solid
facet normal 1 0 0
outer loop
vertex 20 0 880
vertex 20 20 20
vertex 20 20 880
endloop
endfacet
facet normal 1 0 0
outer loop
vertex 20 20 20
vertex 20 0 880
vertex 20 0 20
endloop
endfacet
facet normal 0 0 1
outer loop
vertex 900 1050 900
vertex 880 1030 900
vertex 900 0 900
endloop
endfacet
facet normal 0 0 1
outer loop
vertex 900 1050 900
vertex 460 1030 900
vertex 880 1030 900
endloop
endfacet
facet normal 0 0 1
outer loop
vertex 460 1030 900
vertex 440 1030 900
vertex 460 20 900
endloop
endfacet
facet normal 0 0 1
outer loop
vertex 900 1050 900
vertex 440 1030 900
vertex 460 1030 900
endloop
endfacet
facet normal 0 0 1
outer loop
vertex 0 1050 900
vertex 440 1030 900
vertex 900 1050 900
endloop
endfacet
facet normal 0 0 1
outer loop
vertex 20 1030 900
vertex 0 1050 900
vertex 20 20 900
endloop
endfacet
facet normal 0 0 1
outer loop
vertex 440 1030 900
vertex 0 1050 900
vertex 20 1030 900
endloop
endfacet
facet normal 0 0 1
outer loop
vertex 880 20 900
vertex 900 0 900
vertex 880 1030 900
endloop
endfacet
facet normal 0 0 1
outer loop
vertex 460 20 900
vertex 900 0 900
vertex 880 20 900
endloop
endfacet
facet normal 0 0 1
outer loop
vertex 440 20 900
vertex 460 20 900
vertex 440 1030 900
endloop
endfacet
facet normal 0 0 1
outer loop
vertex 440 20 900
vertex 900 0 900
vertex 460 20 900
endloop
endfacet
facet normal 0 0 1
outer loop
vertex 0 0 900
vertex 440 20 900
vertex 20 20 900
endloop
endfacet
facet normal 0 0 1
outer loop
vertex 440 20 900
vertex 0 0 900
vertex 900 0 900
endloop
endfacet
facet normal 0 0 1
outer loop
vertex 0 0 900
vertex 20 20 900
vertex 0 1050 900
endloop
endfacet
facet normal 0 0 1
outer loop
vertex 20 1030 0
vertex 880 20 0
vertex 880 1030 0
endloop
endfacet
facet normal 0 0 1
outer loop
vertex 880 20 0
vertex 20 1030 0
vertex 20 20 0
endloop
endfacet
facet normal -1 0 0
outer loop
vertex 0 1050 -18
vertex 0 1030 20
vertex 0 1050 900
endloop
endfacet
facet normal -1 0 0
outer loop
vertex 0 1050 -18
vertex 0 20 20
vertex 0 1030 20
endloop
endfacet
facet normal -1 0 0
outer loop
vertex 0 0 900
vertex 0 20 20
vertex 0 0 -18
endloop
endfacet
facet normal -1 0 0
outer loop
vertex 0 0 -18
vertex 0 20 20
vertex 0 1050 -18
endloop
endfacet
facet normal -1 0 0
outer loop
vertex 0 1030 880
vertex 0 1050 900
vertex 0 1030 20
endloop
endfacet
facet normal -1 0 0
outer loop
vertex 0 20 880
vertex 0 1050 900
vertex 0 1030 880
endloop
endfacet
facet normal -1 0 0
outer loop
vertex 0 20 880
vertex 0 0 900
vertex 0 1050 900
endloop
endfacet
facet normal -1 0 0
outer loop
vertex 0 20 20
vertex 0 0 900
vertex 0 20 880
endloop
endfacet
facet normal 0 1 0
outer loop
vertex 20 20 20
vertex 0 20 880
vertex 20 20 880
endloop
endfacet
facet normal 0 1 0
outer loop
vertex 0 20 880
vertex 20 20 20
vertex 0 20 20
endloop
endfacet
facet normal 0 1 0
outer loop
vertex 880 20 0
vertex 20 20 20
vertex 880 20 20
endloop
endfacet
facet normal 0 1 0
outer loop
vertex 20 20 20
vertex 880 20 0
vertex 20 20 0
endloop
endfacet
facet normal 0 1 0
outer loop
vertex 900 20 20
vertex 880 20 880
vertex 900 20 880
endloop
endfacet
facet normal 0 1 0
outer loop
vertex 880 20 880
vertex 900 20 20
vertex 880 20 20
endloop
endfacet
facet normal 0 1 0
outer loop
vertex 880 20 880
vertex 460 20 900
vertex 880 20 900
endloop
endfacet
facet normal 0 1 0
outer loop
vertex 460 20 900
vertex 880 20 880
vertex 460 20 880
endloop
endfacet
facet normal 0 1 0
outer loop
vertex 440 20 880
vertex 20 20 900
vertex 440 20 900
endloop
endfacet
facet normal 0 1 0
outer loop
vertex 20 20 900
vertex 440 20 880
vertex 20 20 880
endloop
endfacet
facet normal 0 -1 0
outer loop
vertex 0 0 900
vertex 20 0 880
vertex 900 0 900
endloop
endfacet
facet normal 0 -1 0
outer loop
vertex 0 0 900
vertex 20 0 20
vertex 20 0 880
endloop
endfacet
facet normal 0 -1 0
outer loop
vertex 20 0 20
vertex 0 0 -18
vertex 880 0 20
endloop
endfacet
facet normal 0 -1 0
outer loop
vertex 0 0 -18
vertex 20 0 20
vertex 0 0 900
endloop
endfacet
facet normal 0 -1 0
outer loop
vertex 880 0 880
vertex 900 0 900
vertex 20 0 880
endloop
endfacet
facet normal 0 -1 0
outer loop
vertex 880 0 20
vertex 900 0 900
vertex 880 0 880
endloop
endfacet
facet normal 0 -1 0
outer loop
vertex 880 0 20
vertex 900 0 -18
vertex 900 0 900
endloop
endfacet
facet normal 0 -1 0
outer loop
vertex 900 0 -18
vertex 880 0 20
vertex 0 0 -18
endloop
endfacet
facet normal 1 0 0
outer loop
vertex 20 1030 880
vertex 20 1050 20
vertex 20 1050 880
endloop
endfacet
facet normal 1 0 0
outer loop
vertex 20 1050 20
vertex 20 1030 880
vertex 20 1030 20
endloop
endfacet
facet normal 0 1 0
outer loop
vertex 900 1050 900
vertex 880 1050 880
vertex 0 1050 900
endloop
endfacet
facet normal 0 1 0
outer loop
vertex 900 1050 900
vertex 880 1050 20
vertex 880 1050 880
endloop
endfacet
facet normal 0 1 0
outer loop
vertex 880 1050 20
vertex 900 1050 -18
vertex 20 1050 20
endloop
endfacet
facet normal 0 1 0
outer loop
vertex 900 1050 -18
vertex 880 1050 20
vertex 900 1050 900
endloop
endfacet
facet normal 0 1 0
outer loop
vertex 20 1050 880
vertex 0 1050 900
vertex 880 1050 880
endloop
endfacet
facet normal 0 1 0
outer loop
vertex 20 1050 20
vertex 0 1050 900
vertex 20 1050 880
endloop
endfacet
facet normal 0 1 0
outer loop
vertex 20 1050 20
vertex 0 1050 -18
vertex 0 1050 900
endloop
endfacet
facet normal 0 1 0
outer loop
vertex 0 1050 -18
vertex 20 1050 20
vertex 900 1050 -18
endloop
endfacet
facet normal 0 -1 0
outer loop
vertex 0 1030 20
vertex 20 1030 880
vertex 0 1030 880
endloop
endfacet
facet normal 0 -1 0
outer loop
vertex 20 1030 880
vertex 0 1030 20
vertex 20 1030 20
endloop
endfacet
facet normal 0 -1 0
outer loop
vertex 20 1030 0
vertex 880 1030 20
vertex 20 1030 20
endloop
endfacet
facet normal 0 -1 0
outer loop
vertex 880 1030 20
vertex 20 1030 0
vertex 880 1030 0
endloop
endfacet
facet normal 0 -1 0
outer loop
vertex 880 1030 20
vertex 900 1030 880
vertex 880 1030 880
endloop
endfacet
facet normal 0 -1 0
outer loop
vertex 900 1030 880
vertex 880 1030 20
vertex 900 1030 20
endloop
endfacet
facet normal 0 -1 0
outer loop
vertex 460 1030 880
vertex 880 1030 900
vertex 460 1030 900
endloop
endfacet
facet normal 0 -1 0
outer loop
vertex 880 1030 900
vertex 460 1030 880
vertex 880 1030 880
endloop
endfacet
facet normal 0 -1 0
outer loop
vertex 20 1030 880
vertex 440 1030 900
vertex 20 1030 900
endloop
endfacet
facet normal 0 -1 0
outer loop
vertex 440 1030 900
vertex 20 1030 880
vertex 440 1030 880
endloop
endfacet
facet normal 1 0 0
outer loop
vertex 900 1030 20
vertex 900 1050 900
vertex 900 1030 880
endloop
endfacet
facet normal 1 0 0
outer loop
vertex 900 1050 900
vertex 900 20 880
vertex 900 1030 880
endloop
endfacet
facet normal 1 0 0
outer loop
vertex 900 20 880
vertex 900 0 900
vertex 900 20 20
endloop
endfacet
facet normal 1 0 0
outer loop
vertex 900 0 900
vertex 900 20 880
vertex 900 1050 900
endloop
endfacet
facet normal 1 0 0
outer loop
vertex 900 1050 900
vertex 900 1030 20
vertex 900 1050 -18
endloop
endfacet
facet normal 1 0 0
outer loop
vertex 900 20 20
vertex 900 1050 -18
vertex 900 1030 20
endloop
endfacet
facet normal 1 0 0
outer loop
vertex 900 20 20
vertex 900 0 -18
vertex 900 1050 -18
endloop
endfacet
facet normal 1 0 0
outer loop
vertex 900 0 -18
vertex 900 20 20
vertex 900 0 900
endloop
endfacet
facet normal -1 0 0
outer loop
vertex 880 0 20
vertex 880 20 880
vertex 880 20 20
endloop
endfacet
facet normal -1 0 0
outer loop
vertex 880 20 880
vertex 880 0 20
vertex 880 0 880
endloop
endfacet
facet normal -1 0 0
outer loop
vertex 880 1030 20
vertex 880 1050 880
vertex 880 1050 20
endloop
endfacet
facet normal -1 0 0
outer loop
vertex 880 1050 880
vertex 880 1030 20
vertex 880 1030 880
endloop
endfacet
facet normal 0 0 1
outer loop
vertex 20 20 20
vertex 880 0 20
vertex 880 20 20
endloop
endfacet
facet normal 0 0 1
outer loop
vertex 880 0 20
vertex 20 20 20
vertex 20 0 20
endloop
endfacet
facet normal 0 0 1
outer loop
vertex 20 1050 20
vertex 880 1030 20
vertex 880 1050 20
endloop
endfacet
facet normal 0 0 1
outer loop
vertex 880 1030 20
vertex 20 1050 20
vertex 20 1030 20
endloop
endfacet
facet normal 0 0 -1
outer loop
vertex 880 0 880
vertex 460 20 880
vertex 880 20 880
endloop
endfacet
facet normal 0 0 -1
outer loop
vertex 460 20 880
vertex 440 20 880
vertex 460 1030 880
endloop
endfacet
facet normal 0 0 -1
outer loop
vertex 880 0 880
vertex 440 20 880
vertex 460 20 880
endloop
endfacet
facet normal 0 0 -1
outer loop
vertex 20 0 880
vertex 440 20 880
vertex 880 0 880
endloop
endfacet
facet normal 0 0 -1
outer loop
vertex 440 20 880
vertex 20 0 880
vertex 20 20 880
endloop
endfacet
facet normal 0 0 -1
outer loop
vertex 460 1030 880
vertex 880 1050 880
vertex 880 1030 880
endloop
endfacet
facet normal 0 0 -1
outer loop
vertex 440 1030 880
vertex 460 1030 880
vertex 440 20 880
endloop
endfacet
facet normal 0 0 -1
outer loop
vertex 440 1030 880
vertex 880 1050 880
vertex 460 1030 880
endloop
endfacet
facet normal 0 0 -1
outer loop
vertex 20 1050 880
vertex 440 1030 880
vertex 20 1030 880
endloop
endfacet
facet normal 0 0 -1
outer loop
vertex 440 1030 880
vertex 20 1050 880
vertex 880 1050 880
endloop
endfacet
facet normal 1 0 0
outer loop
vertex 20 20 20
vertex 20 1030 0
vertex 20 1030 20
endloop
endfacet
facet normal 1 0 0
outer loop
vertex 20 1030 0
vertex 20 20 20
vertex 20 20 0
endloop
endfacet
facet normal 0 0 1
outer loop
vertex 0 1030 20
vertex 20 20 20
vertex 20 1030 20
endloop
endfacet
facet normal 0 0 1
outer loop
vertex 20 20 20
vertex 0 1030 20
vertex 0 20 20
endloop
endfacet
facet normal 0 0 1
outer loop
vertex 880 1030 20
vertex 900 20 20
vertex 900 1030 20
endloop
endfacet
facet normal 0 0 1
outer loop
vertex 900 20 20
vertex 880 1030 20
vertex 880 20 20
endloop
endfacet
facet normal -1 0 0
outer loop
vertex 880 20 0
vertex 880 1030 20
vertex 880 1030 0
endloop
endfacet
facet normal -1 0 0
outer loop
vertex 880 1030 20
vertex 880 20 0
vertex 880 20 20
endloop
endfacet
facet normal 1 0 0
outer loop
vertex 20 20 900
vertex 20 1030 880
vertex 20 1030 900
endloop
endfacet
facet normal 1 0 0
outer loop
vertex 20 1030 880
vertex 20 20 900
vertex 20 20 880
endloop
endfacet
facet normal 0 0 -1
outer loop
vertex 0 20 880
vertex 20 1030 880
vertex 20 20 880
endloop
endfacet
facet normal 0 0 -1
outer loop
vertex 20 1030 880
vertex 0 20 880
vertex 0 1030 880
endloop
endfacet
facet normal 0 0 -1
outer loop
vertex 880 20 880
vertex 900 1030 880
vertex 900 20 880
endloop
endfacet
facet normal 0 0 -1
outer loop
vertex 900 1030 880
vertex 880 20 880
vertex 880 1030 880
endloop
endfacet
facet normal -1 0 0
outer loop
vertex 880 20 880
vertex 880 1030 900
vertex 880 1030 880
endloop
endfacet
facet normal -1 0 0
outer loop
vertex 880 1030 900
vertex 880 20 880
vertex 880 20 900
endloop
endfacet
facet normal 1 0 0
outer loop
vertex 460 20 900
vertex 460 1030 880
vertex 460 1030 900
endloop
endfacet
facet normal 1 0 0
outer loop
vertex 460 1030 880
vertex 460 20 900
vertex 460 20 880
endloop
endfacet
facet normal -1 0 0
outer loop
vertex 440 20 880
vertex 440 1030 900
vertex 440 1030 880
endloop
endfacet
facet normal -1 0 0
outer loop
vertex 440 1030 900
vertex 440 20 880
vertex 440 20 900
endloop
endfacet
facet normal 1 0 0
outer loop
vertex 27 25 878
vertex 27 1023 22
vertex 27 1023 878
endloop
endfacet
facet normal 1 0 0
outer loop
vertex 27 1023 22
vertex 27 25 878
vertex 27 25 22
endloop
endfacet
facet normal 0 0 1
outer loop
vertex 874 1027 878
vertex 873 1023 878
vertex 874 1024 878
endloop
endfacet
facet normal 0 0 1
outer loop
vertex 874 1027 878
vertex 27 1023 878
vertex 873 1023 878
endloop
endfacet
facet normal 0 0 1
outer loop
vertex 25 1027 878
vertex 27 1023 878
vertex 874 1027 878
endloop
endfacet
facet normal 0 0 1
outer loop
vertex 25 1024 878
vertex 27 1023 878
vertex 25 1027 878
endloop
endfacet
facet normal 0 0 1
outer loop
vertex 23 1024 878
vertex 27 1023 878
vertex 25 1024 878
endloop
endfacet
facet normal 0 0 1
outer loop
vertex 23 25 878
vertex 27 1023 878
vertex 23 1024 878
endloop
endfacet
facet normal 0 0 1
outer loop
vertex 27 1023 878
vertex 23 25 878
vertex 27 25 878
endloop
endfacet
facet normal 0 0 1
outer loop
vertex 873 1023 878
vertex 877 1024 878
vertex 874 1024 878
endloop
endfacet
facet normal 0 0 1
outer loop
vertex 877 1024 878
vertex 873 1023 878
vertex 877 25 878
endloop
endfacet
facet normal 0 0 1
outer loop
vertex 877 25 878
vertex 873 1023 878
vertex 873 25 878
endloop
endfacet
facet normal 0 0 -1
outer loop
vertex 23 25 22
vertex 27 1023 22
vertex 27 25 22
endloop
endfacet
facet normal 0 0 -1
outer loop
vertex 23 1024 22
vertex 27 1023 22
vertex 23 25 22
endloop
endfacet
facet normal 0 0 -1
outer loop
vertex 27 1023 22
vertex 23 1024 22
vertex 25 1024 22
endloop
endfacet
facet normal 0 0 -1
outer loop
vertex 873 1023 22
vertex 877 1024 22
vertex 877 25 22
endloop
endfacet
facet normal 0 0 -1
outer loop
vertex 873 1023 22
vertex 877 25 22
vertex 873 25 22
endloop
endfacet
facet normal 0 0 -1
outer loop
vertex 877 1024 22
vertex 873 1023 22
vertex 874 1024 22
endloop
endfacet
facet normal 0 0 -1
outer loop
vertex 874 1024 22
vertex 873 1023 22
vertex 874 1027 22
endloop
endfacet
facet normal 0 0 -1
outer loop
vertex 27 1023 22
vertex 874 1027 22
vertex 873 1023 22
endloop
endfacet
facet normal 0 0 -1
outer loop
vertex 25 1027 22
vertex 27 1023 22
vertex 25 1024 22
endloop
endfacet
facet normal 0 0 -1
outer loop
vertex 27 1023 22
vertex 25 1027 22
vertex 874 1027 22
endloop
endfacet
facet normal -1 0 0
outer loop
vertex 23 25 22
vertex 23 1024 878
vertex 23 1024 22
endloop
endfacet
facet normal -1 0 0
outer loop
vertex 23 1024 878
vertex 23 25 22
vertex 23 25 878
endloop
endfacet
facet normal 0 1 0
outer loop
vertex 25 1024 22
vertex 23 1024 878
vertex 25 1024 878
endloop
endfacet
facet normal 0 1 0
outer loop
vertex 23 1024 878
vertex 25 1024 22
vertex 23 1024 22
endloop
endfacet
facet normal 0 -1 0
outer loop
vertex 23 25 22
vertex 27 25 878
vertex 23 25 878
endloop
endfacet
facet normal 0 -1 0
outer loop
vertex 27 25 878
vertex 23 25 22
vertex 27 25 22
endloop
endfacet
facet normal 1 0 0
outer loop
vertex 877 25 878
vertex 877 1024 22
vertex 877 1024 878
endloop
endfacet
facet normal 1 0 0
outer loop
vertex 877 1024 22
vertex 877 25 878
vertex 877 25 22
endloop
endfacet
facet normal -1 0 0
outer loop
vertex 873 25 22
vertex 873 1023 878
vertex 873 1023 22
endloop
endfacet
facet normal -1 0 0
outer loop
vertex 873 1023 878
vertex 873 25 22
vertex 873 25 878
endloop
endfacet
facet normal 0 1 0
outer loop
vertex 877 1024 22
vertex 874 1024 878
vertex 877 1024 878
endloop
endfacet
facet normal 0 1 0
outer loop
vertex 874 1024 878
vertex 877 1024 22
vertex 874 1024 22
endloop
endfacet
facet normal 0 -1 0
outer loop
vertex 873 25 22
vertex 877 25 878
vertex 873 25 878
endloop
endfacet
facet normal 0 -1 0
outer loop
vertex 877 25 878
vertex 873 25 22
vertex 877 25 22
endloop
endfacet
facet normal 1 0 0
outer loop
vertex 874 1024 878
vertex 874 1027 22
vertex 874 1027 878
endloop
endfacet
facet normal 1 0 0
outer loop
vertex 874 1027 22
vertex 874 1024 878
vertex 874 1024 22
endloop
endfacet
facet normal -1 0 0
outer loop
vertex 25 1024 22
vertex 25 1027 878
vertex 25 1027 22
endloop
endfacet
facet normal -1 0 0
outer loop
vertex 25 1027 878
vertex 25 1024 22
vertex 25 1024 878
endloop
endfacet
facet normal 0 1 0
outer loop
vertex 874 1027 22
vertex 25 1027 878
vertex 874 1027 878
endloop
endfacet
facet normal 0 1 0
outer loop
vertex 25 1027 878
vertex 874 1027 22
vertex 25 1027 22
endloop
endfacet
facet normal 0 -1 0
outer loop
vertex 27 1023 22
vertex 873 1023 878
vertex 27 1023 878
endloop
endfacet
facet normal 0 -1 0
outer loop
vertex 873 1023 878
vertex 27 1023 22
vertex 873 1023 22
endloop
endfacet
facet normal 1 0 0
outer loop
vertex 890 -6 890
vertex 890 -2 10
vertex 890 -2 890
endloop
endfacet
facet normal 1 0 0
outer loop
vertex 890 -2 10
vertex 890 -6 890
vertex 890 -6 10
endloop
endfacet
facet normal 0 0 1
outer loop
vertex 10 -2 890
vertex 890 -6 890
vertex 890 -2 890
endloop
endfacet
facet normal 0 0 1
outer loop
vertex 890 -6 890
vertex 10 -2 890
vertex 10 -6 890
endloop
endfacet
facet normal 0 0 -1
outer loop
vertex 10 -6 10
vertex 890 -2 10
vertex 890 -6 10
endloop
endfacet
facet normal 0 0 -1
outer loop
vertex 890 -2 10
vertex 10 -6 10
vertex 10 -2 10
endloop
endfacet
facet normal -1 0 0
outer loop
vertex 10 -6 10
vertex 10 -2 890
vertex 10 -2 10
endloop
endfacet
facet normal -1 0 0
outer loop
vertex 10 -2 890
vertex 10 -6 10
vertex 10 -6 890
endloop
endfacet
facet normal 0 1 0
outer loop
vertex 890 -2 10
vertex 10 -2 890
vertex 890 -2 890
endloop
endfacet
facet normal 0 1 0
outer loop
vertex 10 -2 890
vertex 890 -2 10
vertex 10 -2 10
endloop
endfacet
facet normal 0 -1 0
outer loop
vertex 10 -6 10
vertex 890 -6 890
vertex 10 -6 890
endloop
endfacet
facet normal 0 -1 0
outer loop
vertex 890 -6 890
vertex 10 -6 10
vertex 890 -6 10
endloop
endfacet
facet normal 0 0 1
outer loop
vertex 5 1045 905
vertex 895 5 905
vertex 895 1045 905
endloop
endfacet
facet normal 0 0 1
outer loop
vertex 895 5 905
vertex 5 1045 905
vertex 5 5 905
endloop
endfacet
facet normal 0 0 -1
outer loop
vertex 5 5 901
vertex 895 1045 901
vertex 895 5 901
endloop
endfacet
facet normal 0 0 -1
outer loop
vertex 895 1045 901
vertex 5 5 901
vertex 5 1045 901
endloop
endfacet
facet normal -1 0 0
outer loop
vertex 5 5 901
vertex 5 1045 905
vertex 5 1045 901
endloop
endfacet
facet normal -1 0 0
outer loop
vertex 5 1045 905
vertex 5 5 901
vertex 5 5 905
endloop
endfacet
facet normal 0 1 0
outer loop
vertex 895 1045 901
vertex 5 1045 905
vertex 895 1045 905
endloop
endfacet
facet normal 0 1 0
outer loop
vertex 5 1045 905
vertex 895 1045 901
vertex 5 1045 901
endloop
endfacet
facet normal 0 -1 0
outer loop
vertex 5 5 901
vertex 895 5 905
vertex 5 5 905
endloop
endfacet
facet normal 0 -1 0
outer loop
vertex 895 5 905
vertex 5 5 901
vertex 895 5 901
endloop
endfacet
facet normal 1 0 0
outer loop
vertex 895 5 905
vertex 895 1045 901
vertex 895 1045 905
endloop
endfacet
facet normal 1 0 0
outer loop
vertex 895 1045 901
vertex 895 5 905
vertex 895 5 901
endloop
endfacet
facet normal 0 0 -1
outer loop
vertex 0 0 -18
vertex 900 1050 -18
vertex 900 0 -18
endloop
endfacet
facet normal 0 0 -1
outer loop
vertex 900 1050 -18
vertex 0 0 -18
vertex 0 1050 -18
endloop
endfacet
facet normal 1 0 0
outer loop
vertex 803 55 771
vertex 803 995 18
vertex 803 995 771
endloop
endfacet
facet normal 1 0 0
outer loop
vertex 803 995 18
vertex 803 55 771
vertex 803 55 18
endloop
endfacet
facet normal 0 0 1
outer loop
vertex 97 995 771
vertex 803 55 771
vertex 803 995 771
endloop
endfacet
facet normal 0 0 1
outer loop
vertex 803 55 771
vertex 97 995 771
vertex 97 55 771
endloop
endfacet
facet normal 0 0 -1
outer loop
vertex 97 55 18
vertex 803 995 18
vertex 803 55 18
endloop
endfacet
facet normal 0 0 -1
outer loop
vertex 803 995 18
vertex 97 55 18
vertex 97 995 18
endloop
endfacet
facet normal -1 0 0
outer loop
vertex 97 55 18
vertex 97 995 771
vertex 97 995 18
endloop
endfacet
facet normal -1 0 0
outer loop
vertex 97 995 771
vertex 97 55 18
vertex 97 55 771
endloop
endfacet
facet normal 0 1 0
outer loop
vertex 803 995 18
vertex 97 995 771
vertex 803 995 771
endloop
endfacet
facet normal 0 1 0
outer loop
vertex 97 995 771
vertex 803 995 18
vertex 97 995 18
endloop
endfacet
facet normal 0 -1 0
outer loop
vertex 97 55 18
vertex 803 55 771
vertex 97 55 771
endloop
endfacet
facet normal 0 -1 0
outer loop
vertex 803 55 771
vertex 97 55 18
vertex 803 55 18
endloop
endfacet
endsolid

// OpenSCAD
/* Visual, non-printable reference assembly for the Kobra 3 Max enclosure. */
W=900; D=1050; H=900; B=20; G=4;
IW=W-2*B; ID=D-2*B; IH=H-2*B;

module timber_x(l) cube([l,B,B]);
module timber_y(l) cube([B,l,B]);
module timber_z(l) cube([B,B,l]);

module frame() {
  color([0.72,0.52,0.28]) {
    for (x=[0,W-B],y=[0,D-B]) translate([x,y,0]) timber_z(H);
    for (z=[0,H-B],y=[0,D-B]) translate([B,y,z]) timber_x(IW);
    for (z=[0,H-B],x=[0,W-B]) translate([x,B,z]) timber_y(ID);
    translate([(W-B)/2,B,H-B]) timber_y(ID);
  }
}

module panels() {
  color([0.45,0.78,0.92,0.32]) {
    translate([B+3,B+5,B+2]) cube([G,999,856]);
    translate([W-B-3-G,B+5,B+2]) cube([G,999,856]);
    translate([B+5,D-B-3-G,B+2]) cube([849,G,856]);
    translate([10,-G-2,10]) cube([880,G,880]);
    translate([5,5,H+1]) cube([450,1040,G]);
    translate([W-455,5,H+1]) cube([450,1040,G]);
  }
}

module printer_keepout() {
  // Conservative planning envelope: 706 W x 940 D x 753 H.
  color([0.25,0.25,0.30,0.20])
    translate([(W-706)/2,(D-940)/2,18]) cube([706,940,753]);
}

module base() {
  color([0.45,0.30,0.18]) translate([0,0,-18]) cube([W,D,18]);
}

base(); frame(); panels(); printer_keepout();
